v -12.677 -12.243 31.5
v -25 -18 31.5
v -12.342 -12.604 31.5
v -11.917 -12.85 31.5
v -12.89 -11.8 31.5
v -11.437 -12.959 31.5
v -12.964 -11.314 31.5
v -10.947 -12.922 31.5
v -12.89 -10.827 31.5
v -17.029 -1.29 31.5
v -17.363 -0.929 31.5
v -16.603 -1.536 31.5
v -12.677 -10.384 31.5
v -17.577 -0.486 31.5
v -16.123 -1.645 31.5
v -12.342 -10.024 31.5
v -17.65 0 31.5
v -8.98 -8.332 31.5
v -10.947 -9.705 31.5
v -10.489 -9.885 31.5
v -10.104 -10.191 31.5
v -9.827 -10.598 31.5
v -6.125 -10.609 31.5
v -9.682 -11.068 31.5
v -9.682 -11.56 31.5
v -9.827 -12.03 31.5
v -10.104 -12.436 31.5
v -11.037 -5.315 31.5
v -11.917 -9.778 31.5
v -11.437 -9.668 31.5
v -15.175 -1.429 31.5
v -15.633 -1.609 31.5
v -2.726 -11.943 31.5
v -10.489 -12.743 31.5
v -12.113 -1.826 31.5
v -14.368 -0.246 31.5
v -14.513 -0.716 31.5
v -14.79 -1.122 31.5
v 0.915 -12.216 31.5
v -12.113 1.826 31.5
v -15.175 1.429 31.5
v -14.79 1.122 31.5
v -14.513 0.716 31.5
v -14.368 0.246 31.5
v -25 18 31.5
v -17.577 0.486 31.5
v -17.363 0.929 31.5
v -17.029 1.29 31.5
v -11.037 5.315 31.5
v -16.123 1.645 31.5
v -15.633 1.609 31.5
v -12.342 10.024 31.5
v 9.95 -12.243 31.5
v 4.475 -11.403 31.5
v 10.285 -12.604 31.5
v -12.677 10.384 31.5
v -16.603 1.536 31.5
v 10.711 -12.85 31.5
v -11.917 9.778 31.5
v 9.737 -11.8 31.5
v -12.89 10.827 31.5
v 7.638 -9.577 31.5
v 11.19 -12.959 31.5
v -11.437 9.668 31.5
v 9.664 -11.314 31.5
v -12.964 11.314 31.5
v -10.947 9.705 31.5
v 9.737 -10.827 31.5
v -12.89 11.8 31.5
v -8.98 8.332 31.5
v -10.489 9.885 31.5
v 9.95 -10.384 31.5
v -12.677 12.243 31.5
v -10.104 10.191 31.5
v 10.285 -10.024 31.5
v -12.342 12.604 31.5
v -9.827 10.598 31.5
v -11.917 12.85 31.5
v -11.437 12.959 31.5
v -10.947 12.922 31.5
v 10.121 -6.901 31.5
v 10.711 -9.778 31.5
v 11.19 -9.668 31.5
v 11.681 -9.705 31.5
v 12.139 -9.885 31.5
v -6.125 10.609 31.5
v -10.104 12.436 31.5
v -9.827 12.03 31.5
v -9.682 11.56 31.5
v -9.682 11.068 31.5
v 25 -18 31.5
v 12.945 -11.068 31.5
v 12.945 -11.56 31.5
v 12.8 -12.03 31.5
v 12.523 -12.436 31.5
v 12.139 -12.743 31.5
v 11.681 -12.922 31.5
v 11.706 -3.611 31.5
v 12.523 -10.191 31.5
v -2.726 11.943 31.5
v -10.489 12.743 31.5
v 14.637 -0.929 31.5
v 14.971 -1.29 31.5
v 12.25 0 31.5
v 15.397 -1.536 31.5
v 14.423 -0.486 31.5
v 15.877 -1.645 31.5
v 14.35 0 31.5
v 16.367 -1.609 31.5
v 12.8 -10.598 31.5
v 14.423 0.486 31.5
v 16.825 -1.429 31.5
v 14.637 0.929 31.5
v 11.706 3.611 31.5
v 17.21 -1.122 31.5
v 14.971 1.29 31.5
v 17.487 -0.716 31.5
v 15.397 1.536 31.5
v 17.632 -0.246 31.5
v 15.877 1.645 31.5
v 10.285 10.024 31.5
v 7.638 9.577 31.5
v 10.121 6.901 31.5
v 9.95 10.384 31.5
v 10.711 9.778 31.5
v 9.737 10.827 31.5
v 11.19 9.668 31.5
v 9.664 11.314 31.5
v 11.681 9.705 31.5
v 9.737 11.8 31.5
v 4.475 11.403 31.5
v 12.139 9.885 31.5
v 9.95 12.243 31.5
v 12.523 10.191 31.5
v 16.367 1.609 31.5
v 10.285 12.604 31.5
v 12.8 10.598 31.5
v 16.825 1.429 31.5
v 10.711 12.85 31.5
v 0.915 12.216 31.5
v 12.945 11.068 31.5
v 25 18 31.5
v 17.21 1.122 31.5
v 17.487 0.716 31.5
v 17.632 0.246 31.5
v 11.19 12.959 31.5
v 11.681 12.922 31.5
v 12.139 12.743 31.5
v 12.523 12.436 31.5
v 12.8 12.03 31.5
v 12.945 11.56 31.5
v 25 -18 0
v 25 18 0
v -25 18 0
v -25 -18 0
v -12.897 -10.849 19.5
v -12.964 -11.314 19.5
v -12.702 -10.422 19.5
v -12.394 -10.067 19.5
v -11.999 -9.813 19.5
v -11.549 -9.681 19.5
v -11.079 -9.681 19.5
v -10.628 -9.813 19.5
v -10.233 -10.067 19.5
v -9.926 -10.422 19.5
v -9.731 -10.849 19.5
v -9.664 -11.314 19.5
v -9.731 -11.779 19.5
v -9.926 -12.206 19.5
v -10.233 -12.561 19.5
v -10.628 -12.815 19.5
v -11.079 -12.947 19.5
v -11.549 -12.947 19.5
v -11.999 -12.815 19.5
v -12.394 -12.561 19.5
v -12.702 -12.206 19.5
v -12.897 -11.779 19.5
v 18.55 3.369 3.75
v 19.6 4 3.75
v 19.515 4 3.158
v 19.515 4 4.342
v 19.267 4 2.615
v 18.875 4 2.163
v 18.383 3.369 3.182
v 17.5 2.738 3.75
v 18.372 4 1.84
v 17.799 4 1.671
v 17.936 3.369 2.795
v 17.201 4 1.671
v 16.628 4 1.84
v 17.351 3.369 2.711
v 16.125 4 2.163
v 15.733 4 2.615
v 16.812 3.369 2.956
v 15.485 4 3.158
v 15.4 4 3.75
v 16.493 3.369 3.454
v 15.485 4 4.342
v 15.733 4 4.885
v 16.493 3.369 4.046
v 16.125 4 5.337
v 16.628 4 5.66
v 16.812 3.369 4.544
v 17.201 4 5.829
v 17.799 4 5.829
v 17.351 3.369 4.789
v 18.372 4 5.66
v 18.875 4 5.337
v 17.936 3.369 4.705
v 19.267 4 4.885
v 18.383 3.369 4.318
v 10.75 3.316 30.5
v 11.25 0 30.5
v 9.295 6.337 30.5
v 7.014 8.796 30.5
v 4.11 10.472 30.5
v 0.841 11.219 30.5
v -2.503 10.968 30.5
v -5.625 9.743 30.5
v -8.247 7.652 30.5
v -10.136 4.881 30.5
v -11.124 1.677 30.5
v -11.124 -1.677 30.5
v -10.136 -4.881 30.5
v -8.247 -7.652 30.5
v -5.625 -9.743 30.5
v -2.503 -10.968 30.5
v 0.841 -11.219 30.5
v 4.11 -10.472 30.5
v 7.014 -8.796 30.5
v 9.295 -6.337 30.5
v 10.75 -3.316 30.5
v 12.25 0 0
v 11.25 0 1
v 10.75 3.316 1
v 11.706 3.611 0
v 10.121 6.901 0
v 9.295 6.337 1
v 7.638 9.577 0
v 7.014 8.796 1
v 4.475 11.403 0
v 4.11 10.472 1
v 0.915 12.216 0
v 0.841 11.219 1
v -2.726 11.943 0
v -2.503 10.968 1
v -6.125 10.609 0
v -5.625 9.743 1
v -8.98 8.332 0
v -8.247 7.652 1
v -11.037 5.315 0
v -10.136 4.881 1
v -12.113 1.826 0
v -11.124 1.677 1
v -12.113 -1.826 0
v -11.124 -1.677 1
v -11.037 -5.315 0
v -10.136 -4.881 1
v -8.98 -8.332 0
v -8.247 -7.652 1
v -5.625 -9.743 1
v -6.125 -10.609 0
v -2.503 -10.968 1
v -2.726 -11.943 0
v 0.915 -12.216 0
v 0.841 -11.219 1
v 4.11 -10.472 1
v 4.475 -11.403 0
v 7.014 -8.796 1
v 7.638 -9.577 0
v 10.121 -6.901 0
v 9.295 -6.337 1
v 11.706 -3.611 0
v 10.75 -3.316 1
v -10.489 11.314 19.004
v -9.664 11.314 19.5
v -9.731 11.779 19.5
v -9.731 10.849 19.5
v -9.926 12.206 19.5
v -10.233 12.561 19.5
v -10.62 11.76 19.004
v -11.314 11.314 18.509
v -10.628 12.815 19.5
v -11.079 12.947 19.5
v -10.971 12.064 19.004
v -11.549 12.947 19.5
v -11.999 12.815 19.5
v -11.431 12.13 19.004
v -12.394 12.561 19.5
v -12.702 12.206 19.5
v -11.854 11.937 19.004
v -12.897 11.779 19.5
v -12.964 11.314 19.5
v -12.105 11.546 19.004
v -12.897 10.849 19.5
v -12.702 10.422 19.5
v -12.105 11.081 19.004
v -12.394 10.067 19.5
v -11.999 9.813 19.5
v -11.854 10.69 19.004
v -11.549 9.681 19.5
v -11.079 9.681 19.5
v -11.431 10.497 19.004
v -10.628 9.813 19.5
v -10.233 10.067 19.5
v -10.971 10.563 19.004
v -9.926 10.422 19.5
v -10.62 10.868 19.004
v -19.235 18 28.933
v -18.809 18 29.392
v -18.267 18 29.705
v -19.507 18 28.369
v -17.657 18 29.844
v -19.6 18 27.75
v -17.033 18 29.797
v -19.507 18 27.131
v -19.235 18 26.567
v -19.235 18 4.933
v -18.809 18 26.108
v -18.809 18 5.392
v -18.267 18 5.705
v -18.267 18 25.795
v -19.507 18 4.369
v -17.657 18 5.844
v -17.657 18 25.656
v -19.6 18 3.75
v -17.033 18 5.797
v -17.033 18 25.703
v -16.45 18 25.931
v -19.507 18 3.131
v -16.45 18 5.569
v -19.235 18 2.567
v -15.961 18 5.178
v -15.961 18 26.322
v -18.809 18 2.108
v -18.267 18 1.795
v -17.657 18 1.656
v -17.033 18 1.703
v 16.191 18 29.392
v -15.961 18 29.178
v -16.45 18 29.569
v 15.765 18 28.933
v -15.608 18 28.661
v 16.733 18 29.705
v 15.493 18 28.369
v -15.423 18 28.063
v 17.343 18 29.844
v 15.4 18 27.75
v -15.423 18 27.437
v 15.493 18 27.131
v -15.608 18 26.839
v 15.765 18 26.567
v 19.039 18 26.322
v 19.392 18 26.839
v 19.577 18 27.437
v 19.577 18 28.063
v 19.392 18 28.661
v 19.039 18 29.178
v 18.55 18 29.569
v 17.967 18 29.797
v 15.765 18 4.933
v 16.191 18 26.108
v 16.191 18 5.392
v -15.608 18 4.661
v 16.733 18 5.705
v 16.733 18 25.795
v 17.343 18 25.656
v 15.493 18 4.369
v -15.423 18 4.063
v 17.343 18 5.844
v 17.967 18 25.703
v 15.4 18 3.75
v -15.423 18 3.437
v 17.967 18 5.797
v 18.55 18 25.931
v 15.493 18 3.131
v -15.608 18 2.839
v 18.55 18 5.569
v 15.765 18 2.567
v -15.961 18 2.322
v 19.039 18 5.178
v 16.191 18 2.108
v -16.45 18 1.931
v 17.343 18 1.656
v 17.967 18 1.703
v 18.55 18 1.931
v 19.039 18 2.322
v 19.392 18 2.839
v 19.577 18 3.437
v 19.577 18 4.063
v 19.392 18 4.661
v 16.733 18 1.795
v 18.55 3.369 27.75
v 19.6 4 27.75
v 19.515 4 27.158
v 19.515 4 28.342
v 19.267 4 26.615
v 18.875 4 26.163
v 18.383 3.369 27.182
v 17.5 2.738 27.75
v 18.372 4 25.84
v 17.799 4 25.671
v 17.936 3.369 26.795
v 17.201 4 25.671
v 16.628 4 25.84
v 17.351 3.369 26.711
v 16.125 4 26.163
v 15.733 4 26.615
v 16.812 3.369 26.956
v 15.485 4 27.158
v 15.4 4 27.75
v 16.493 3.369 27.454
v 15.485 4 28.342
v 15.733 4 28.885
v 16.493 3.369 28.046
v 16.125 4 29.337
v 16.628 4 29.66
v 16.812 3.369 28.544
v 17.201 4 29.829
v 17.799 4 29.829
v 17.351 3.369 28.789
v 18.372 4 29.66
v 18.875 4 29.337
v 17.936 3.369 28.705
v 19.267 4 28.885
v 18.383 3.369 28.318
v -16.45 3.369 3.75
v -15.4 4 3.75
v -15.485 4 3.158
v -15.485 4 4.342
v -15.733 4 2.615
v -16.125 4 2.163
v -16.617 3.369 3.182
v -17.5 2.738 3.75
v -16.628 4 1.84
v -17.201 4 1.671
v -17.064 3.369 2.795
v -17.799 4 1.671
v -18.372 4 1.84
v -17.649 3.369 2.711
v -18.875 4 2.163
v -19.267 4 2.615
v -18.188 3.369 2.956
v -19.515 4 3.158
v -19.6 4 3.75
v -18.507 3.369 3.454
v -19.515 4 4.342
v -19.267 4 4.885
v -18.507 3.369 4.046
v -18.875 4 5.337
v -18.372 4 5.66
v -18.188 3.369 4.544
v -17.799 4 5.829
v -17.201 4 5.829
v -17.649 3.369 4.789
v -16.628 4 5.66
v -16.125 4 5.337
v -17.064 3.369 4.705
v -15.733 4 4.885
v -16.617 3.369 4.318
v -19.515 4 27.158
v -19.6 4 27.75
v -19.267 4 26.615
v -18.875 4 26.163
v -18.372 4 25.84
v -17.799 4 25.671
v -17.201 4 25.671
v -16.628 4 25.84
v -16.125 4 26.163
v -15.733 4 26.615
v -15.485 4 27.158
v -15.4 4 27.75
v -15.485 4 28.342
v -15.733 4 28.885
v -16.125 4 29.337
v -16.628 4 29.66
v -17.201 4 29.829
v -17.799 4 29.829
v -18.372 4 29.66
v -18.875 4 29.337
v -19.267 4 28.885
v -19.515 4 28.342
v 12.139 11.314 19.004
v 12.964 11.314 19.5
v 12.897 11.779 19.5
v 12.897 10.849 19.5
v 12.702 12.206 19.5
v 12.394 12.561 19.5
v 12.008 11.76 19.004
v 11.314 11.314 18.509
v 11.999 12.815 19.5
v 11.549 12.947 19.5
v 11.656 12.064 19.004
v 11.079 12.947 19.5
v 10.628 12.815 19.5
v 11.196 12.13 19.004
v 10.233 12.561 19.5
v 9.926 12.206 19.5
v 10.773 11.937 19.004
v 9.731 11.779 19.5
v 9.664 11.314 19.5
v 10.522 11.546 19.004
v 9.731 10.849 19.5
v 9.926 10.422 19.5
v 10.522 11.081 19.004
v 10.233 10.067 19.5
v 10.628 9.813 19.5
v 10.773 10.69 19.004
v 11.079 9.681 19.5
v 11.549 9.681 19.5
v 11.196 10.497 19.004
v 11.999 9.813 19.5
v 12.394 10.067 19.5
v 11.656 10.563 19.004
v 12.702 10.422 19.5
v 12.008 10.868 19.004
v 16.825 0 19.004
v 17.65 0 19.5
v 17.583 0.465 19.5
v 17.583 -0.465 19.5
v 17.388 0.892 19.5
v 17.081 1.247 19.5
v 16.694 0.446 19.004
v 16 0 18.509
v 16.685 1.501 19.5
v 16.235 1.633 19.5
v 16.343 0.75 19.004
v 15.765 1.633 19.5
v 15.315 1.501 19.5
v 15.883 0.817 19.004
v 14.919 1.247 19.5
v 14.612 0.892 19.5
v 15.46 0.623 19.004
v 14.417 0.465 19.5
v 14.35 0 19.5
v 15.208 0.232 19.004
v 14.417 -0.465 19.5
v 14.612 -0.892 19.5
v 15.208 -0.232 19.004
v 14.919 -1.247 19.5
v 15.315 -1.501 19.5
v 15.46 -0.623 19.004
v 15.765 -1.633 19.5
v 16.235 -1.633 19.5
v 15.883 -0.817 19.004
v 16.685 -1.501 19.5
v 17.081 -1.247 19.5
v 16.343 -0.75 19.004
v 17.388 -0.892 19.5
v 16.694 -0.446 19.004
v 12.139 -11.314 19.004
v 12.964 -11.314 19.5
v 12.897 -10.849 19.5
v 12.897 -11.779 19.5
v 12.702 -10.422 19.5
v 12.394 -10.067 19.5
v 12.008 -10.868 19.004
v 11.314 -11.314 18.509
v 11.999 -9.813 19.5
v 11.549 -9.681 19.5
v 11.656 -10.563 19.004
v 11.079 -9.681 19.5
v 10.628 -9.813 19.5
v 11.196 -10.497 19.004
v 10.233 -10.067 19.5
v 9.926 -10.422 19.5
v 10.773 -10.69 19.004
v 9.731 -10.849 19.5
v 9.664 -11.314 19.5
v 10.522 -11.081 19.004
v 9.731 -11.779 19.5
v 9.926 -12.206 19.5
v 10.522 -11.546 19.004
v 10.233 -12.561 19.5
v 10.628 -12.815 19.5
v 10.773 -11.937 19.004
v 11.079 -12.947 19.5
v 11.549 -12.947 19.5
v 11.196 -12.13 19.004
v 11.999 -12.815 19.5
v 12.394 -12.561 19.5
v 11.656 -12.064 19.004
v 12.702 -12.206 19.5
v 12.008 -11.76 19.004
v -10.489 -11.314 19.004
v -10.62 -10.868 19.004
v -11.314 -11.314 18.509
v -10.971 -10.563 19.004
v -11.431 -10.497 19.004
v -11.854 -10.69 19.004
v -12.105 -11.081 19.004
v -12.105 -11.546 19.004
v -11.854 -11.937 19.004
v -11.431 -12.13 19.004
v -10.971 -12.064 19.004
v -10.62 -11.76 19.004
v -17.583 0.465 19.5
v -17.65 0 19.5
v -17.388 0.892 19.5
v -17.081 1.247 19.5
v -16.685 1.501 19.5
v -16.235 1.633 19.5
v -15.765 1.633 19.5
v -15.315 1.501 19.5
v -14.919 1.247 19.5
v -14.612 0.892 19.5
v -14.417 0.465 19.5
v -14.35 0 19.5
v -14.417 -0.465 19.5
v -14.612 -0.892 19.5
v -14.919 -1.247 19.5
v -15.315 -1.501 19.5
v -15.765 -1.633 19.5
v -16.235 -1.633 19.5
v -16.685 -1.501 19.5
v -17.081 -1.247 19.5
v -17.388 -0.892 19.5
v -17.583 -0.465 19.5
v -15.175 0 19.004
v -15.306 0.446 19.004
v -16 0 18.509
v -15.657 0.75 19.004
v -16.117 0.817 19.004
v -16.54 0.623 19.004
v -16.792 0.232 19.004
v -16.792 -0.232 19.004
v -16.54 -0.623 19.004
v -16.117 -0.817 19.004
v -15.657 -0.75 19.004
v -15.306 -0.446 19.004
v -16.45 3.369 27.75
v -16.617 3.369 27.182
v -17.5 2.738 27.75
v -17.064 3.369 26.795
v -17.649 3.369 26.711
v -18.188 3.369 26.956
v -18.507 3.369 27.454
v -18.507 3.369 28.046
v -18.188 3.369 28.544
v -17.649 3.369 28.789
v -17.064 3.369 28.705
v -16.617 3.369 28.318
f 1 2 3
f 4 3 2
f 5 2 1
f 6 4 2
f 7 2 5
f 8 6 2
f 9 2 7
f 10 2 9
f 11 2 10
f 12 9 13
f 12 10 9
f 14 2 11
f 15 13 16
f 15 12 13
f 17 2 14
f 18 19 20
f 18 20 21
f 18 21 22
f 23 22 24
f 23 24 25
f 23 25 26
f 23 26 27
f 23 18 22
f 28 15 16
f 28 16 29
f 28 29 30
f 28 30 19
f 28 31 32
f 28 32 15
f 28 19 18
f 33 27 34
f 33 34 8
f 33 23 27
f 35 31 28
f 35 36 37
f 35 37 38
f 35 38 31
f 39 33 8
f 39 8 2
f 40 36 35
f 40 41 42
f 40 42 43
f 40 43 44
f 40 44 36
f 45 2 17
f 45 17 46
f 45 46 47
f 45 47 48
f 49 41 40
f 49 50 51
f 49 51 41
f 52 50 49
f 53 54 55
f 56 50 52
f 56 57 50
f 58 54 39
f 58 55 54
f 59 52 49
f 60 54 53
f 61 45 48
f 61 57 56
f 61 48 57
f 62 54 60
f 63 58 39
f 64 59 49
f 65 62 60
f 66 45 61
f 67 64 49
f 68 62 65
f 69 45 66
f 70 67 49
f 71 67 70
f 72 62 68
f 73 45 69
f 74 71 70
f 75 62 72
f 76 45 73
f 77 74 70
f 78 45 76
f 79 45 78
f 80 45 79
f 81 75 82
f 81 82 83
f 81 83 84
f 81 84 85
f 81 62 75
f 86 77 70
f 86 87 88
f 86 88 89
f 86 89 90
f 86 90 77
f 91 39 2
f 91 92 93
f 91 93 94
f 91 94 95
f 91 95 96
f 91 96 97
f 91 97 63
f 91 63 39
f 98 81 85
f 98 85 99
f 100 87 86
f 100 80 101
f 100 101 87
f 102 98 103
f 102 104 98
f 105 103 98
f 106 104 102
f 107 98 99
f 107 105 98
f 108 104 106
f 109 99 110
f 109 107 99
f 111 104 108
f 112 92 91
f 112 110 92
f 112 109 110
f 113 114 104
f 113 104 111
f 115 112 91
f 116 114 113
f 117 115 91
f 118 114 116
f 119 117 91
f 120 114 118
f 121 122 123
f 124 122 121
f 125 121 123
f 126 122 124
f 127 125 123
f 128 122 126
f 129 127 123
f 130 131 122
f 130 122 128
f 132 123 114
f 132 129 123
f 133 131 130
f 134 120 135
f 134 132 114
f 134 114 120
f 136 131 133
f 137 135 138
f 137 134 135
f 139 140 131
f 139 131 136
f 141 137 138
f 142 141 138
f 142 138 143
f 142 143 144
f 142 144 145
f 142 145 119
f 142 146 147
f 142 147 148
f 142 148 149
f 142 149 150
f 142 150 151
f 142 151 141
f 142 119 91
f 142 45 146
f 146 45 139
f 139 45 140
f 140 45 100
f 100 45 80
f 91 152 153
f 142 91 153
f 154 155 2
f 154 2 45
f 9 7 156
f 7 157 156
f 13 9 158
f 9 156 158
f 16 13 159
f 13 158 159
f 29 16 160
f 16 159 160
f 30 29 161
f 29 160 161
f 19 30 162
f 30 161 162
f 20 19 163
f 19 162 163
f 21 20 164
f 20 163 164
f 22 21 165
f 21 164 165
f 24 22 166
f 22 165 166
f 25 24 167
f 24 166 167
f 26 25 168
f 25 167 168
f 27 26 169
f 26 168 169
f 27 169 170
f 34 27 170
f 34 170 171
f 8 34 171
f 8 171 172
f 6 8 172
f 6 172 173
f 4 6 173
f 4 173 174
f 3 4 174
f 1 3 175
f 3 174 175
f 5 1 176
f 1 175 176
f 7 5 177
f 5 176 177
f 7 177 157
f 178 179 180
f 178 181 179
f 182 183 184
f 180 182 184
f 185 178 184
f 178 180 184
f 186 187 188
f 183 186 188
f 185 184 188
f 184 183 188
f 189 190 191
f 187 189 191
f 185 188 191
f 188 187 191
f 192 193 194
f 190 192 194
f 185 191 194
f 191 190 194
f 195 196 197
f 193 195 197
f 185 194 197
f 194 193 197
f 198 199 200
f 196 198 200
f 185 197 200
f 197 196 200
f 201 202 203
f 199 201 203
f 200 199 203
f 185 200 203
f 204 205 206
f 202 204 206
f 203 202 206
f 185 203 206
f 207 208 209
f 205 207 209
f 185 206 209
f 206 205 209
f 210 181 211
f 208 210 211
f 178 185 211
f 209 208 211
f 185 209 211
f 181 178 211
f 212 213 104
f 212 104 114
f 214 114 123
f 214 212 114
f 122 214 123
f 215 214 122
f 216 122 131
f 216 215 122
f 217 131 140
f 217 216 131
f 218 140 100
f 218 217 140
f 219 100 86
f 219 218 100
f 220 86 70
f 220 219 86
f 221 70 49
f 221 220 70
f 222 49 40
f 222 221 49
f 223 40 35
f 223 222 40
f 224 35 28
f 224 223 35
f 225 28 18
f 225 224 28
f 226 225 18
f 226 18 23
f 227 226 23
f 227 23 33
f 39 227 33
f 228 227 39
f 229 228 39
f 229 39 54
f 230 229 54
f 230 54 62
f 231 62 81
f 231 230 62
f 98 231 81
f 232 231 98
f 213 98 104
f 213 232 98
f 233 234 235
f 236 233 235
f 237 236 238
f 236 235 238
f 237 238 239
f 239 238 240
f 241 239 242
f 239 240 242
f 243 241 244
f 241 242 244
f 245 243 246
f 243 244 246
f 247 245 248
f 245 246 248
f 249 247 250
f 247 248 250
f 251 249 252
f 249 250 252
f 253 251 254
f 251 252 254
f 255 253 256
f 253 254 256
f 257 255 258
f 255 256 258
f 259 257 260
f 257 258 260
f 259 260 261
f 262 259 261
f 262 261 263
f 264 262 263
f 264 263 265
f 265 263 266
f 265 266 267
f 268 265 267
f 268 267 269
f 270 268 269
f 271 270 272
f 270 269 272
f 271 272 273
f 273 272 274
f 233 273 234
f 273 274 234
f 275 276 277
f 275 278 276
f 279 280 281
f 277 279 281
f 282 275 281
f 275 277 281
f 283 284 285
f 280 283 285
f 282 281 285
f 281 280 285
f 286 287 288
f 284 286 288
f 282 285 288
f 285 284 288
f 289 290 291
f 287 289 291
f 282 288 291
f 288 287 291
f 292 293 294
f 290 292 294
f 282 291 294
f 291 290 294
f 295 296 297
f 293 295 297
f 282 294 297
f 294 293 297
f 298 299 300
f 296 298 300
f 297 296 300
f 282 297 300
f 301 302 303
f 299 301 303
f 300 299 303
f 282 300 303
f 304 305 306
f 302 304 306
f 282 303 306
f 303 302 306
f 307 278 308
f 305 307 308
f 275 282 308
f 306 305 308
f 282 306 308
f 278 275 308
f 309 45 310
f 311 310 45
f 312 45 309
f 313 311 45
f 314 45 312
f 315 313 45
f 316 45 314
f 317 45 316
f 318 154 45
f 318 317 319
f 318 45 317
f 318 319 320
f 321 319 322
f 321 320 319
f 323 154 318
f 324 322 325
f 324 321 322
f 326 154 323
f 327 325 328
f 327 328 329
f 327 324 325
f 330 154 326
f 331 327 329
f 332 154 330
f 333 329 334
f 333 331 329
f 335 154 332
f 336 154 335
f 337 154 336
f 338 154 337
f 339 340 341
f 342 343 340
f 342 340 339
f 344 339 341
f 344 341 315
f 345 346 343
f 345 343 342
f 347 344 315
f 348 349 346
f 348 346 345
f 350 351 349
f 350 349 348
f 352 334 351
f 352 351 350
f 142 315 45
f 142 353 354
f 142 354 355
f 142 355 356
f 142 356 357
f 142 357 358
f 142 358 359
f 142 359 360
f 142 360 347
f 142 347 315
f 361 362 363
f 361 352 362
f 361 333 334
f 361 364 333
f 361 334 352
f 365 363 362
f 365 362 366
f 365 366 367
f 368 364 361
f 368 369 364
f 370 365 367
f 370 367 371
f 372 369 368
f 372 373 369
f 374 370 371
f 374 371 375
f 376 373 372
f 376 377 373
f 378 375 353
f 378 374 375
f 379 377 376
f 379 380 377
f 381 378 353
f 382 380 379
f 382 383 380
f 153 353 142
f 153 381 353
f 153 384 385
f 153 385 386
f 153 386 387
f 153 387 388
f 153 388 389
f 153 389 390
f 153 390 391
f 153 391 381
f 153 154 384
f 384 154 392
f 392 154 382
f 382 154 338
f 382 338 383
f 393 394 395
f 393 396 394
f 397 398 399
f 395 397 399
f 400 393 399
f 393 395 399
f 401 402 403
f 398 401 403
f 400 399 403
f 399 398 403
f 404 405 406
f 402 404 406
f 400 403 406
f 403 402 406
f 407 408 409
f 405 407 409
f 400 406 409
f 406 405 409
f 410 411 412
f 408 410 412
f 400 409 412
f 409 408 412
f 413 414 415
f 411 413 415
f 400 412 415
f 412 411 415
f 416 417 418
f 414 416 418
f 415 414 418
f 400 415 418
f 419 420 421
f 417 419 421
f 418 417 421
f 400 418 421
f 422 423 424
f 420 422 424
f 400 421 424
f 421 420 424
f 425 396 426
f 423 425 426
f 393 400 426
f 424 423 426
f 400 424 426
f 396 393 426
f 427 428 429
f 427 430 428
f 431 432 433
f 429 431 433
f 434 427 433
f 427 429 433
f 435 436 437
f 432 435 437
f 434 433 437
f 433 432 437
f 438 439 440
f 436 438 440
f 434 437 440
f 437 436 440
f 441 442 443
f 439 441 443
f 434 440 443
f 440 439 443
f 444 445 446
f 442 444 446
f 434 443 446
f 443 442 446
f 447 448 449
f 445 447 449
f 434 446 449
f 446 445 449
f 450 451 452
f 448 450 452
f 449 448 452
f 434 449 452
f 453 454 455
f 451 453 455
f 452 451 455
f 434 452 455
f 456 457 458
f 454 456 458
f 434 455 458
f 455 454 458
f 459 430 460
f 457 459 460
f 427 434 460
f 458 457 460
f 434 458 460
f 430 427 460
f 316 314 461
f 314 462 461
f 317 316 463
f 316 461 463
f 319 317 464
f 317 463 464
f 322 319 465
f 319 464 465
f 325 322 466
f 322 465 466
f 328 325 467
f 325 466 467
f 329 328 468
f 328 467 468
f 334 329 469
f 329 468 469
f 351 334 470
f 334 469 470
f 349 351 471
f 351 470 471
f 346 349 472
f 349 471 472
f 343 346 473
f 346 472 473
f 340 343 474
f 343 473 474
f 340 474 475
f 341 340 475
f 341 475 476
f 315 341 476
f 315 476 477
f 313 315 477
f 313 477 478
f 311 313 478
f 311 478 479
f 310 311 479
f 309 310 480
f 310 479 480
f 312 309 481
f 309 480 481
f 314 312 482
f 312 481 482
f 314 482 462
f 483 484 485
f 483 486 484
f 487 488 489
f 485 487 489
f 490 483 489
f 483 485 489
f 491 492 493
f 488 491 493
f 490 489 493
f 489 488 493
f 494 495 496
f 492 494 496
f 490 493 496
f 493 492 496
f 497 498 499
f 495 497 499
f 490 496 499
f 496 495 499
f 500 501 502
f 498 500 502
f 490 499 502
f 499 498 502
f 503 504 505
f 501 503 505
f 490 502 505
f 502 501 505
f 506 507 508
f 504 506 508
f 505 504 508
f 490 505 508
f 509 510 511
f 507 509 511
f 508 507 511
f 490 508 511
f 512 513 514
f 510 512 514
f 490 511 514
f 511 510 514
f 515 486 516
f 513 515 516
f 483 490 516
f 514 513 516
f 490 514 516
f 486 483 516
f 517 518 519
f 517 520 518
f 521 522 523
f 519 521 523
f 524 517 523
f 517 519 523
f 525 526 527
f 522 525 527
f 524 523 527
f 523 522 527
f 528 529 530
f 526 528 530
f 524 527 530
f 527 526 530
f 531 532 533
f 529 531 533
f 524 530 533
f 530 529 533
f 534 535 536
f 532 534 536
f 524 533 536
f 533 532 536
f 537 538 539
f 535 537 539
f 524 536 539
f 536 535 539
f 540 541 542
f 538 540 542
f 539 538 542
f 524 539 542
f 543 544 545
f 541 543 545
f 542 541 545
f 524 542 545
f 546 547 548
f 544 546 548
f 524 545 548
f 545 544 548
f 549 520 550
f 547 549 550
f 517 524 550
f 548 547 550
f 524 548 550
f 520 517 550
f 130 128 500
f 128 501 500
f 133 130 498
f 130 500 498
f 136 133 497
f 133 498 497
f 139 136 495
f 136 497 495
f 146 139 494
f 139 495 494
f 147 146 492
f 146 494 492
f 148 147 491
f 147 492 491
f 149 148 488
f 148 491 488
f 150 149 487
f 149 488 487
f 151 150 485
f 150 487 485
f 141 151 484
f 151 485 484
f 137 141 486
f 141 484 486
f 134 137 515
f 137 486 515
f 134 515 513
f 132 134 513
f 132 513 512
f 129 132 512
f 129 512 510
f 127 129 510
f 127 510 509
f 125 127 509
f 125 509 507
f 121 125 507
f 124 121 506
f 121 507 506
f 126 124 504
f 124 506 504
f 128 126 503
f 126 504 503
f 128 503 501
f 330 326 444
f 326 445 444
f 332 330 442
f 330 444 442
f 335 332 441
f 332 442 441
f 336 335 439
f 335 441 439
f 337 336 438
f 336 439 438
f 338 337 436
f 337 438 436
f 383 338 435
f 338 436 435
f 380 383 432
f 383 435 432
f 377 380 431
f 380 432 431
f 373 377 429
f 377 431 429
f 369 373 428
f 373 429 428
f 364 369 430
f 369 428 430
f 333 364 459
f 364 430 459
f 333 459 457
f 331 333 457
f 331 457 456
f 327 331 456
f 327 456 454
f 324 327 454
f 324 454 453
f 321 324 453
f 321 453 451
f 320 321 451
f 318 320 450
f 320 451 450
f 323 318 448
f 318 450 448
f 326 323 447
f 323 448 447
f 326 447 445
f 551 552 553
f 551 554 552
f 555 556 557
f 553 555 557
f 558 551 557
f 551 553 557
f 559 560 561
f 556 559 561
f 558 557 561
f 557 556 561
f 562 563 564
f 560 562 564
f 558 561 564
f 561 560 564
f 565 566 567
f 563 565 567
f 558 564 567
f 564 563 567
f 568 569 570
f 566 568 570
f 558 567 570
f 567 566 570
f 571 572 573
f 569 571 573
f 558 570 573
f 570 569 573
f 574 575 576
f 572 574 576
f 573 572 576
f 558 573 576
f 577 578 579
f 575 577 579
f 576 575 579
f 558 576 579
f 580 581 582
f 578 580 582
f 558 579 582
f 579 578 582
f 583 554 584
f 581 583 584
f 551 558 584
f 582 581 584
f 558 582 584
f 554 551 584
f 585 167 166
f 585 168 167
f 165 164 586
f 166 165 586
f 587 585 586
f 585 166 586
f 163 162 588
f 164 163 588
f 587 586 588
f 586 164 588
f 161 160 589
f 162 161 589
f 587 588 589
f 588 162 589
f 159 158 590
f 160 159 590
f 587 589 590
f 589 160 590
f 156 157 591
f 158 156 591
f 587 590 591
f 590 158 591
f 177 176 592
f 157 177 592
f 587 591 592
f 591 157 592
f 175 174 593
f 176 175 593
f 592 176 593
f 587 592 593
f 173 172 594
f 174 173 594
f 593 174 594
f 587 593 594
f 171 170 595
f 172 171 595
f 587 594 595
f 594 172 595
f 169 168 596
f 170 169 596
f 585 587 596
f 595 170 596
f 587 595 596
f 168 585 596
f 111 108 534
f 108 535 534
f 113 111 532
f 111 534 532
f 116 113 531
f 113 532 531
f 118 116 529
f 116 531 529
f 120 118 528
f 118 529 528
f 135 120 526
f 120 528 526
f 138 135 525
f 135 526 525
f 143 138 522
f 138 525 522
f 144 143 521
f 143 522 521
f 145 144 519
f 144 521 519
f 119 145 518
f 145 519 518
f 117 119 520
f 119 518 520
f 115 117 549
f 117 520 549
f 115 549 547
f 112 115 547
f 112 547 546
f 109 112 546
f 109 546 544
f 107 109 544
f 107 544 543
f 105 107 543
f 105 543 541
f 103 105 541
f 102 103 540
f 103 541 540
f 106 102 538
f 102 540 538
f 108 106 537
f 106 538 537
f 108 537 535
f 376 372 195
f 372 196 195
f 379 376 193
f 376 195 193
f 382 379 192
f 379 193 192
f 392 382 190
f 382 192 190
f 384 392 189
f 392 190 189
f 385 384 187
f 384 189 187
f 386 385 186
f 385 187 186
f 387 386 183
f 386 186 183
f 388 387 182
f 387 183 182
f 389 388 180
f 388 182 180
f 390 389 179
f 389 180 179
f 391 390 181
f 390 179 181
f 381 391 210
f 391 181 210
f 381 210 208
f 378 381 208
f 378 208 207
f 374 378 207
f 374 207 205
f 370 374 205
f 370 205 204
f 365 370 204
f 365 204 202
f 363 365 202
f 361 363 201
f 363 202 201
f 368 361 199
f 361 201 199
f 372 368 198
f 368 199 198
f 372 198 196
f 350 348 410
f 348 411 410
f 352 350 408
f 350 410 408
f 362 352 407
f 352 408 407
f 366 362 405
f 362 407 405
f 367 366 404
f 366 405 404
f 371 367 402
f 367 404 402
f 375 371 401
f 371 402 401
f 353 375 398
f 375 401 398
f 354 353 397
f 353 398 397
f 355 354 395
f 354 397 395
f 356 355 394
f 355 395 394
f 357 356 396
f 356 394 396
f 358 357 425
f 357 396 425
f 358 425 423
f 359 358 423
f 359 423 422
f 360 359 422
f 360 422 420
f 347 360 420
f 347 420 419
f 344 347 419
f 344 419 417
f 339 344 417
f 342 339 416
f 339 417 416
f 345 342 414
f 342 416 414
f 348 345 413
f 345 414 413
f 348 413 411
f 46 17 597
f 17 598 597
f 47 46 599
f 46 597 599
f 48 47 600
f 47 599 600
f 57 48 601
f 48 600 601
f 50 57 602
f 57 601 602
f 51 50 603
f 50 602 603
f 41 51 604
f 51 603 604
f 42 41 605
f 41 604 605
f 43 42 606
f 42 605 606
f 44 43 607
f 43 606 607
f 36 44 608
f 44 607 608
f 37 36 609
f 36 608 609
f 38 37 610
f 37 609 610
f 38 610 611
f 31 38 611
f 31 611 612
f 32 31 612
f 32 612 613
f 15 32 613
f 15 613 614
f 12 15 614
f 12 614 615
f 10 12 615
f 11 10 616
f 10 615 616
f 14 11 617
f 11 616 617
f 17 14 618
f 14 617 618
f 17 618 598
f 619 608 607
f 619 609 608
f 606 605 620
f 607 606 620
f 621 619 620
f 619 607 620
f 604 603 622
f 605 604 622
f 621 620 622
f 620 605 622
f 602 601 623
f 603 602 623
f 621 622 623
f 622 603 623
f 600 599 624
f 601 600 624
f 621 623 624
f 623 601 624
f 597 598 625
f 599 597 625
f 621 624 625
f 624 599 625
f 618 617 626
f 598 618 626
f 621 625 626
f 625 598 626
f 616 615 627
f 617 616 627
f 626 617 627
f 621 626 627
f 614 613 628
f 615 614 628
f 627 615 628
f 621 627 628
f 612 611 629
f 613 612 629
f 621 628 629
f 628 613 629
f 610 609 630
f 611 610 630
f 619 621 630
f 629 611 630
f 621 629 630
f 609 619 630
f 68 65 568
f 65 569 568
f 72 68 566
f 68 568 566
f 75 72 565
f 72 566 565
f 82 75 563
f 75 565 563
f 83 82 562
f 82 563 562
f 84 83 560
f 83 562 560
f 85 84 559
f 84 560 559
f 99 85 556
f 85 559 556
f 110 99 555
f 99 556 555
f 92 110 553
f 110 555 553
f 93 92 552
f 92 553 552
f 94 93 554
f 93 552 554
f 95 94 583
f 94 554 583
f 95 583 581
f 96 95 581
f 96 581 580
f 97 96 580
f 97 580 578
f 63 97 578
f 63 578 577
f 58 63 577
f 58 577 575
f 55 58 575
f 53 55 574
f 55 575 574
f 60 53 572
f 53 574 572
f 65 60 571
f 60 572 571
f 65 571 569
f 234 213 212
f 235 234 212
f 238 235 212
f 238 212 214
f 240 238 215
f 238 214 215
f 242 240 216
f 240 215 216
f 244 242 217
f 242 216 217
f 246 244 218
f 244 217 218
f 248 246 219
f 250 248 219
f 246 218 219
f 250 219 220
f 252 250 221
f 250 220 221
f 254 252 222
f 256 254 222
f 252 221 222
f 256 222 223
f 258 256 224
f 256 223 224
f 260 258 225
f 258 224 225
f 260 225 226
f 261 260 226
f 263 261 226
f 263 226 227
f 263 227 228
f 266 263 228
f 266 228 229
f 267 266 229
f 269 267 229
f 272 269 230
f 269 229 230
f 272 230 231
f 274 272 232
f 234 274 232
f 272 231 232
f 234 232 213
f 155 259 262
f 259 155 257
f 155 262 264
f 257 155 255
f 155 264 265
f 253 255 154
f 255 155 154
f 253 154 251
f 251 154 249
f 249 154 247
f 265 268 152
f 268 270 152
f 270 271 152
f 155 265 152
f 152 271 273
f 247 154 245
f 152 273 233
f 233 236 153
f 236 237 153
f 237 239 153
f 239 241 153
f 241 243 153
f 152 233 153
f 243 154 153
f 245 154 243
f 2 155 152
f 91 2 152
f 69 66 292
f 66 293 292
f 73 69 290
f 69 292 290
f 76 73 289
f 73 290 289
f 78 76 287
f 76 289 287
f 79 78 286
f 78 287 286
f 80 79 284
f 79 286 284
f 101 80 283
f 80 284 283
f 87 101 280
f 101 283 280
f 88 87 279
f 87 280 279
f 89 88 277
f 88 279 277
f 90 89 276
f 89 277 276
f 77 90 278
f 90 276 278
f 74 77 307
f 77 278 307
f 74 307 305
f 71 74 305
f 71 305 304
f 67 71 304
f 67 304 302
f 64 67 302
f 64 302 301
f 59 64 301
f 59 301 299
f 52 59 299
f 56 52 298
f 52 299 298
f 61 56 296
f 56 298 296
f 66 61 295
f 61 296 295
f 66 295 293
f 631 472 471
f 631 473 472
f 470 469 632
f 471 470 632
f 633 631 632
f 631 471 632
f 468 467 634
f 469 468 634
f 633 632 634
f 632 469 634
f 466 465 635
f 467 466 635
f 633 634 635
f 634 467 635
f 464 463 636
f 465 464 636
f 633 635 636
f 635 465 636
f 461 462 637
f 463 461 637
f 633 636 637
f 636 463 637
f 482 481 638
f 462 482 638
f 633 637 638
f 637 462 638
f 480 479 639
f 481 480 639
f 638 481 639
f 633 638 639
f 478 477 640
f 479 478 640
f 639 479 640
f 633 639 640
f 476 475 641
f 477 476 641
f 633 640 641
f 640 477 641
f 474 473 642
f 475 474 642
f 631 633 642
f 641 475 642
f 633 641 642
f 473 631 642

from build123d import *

# Parameters (mm, degrees)
ESQUISSE1_W               = 50
ESQUISSE1_H               = 36
BOSS_EXTRU_1_DEPTH        = 31.5
ESQUISSE2_R               = 11.25
ENL_V_MAT_EXTRU_1_DEPTH   = 31.5
TROU_TARAUD_M4X0_71_D     = 3.3
TROU_TARAUD_M4X0_71_DEPTH = 12
TROU_TARAUD_M4X0_71_TIP   = 0.991420021
TROU_TARAUD_M5X0_81_D     = 4.2
TROU_TARAUD_M5X0_81_DEPTH = 14
TROU_TARAUD_M5X0_81_TIP   = 1.2618073
CHANFREIN1_SIZE           = 1


with BuildPart() as part:
    # Esquisse1 → Boss.-Extru.1 (new body)
    with BuildSketch(Plane.XY):
        Rectangle(ESQUISSE1_W, ESQUISSE1_H)
    extrude(amount=BOSS_EXTRU_1_DEPTH)

    # Esquisse2 → Enlèv. mat.-Extru.1 (cut)
    with BuildSketch(Plane.XY.offset(31.5)):
        Circle(ESQUISSE2_R)
    extrude(amount=-ENL_V_MAT_EXTRU_1_DEPTH, mode=Mode.SUBTRACT)

    # Trou taraudé M4x0.71
    with Locations(Plane.XY.offset(31.5)):
        with Locations((-11.313708499, 11.313708499), (-16, 0), (-11.313708499, -11.313708499), (11.313708499, -11.313708499), (16, 0), (11.313708499, 11.313708499)):
            Hole(TROU_TARAUD_M4X0_71_D / 2, depth=TROU_TARAUD_M4X0_71_DEPTH)
            with Locations((0, 0, -(TROU_TARAUD_M4X0_71_DEPTH + TROU_TARAUD_M4X0_71_TIP / 2))):  # 118° drill point
                Cone(0, TROU_TARAUD_M4X0_71_D / 2, TROU_TARAUD_M4X0_71_TIP, mode=Mode.SUBTRACT)

    # Trou taraudé M5x0.81
    with Locations(Plane(origin=(0, 18, 0), x_dir=(1, 0, 0), z_dir=(0, 1, 0))):
        with Locations((-17.5, -27.75), (-17.5, -3.75), (17.5, -3.75), (17.5, -27.75)):
            Hole(TROU_TARAUD_M5X0_81_D / 2, depth=TROU_TARAUD_M5X0_81_DEPTH)
            with Locations((0, 0, -(TROU_TARAUD_M5X0_81_DEPTH + TROU_TARAUD_M5X0_81_TIP / 2))):  # 118° drill point
                Cone(0, TROU_TARAUD_M5X0_81_D / 2, TROU_TARAUD_M5X0_81_TIP, mode=Mode.SUBTRACT)

    # Chanfrein1
    chanfrein1_edges = [part.edges().sort_by_distance(p)[0] for p in [
        (-11.25, 0, 0),
        (-11.25, 0, 31.5),
    ]]
    chamfer(chanfrein1_edges, length=CHANFREIN1_SIZE)


solid = part.part
